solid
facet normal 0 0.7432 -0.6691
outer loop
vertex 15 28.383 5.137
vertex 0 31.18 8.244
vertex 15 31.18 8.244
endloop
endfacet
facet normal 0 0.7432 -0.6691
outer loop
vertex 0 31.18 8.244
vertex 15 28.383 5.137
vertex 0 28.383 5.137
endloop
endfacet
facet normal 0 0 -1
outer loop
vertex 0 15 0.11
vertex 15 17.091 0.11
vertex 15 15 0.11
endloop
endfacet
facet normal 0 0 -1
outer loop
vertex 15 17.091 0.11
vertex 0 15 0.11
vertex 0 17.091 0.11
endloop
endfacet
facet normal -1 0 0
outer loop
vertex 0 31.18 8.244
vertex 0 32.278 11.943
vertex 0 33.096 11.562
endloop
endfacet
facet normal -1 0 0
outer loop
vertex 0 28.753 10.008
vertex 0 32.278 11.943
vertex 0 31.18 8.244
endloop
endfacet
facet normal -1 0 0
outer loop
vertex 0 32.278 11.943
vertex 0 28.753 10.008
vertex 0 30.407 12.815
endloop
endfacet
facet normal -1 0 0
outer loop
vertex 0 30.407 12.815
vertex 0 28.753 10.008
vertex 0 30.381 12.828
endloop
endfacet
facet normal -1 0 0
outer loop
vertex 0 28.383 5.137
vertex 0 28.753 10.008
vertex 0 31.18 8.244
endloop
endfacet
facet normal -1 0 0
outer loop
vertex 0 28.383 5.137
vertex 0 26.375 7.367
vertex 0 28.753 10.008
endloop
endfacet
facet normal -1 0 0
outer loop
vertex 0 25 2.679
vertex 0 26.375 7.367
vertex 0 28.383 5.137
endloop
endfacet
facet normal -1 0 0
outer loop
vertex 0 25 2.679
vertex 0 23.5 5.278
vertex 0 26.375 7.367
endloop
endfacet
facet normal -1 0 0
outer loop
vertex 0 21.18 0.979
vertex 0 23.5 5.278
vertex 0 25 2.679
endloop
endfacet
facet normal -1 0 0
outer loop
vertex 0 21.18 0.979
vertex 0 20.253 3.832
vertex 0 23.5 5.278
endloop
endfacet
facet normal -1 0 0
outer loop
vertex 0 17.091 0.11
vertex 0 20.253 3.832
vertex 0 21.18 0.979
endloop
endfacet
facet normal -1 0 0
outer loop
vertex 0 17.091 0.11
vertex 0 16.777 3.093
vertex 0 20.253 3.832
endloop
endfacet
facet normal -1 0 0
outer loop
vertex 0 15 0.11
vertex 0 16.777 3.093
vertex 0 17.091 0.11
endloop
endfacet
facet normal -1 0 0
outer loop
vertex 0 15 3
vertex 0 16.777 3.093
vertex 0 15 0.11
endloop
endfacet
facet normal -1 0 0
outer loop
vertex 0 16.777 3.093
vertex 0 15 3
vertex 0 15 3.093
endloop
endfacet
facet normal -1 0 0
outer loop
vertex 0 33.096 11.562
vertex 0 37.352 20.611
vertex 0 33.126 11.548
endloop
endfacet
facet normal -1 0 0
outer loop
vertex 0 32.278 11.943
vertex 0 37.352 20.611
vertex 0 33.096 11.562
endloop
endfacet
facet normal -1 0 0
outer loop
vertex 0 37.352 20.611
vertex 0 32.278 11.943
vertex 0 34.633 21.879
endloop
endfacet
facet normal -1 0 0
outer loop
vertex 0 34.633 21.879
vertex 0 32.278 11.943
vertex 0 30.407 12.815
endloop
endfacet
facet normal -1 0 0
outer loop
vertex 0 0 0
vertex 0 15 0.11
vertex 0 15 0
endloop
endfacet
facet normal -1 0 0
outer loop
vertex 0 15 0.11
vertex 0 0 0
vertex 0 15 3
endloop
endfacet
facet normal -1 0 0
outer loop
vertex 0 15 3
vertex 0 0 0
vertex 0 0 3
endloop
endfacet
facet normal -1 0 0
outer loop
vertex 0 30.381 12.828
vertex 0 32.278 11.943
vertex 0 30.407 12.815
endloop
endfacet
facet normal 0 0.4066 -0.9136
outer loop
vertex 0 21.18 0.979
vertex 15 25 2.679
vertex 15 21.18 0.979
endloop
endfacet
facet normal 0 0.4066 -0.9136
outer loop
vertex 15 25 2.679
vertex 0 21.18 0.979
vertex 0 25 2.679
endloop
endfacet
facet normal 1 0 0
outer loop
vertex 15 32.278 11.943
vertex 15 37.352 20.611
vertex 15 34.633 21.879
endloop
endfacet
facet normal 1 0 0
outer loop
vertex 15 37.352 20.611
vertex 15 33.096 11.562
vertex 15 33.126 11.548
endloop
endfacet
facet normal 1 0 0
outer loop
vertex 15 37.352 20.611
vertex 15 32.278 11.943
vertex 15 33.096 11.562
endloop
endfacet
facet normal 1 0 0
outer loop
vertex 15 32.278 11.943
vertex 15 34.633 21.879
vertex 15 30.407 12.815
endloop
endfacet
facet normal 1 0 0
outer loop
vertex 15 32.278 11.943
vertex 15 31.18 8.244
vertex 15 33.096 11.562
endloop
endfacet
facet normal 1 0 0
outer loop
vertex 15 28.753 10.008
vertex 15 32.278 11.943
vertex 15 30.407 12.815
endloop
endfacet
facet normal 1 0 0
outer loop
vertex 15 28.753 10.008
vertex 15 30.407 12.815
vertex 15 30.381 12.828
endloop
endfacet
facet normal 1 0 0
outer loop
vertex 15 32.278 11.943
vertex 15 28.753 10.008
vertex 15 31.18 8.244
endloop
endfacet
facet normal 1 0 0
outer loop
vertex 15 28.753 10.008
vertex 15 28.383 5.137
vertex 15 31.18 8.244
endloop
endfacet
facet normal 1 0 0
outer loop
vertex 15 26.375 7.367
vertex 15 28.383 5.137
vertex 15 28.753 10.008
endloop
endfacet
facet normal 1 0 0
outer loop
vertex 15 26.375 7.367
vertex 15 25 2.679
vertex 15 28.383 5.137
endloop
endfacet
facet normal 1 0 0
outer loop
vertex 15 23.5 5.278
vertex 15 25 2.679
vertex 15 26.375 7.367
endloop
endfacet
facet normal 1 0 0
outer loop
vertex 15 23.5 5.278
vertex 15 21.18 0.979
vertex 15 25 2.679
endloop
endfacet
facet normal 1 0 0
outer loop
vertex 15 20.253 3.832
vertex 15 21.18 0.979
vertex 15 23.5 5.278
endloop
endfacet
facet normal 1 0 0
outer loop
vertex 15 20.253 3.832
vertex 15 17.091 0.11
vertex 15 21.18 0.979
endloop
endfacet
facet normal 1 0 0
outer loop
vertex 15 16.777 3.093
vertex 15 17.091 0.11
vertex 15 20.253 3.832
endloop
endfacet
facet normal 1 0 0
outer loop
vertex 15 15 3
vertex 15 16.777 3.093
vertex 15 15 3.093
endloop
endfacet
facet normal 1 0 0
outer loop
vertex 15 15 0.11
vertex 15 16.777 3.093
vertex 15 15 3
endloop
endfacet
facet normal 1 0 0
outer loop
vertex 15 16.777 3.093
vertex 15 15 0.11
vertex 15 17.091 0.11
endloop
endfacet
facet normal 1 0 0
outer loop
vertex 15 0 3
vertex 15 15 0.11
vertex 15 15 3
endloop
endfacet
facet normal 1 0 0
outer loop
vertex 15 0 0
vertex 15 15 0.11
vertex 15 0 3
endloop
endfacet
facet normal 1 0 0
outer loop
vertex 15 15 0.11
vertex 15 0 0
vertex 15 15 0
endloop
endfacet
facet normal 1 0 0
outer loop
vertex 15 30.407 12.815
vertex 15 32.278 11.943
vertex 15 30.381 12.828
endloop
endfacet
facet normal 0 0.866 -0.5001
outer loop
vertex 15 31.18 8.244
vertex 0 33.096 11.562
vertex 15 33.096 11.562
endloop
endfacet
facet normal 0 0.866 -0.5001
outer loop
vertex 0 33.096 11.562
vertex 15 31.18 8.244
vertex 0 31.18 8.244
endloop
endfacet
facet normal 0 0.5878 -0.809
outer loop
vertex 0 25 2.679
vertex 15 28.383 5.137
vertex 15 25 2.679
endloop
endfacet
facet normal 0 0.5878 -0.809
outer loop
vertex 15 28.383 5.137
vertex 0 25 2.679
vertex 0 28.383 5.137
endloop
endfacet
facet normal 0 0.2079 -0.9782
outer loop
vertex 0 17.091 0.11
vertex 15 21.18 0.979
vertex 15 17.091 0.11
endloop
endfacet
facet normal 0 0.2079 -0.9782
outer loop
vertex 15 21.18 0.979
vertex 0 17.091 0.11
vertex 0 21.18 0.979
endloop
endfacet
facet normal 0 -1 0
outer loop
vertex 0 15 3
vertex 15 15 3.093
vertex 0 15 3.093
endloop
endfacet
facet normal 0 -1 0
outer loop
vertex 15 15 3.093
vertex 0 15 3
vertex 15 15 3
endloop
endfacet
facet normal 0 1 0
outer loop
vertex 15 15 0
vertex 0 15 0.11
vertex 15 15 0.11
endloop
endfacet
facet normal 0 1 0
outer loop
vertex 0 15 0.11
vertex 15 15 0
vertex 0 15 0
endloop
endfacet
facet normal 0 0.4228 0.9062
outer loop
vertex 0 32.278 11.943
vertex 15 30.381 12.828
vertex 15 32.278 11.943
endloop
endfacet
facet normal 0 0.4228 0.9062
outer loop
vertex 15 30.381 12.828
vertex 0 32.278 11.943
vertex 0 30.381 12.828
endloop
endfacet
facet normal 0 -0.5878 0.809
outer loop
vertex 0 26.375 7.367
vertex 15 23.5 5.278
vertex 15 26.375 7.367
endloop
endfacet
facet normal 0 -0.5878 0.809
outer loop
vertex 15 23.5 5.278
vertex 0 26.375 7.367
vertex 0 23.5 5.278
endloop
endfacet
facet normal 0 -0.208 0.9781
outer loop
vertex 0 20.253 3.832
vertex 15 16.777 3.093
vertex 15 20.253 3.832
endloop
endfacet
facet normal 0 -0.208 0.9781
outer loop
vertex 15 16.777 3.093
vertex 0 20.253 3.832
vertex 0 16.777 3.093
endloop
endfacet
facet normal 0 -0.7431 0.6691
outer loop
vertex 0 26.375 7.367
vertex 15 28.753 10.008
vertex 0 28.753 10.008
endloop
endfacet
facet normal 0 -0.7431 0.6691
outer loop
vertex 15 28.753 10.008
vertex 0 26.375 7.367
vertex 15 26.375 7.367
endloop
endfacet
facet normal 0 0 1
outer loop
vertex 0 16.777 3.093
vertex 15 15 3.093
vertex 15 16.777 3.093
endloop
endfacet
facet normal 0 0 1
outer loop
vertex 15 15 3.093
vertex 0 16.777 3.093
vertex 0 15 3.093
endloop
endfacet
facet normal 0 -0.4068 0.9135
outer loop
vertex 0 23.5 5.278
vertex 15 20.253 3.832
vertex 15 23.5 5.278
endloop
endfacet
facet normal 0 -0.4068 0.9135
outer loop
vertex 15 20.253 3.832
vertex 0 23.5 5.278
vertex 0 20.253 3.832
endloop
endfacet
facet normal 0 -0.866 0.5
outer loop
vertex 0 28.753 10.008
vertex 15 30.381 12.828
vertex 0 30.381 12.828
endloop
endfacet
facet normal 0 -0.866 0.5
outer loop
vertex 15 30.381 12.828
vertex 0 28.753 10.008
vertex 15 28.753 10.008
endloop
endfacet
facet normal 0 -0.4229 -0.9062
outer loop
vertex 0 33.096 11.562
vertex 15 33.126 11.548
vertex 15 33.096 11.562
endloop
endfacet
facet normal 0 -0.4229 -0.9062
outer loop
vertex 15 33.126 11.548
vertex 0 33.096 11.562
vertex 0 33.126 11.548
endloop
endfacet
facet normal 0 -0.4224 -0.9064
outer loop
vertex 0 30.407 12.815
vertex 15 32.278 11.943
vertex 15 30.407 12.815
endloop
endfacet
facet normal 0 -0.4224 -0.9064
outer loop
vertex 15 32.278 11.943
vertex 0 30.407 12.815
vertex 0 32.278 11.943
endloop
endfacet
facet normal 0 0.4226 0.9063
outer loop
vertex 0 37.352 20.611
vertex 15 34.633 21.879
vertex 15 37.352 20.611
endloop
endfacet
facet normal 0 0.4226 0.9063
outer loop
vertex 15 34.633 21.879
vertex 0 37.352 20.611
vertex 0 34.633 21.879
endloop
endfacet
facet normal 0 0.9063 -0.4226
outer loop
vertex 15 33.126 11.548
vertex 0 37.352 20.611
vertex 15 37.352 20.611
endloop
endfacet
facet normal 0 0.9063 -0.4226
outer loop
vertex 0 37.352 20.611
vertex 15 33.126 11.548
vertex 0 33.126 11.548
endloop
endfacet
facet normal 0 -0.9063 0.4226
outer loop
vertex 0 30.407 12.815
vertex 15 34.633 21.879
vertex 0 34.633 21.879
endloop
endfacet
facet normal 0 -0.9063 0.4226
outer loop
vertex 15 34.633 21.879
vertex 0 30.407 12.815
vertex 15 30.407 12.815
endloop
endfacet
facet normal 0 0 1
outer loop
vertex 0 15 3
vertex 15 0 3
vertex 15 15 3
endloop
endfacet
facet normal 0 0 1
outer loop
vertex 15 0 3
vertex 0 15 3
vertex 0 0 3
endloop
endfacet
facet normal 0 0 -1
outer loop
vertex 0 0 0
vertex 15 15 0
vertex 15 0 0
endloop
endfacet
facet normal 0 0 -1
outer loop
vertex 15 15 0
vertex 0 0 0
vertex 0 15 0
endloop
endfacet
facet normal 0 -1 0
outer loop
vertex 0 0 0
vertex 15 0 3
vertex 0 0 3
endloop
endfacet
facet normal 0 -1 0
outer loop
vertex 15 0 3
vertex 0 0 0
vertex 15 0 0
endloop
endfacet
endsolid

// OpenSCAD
// file: halfCylinder.scad
// Example:
halfCylinder(
  z = 20,
  r = 10
);

module halfCylinder(
  z,
  r,
  mergeMargin = 1 // i.e. how much to overlap joined solids
) {
  difference() {
    // Cylinder itself:
    cylinder(z, r = r);
    // Cutoff part:
    translate([ 0, -r, -mergeMargin ])
    cube([ r, r * 2, z + mergeMargin * 2 ]);
  }
}
// file: pieSlice.scad
use <halfCylinder.scad>;

// Example:
pieSlice(
  z = 10,
  r = 20,
  angle = 65
);

module pieSlice(
  z,
  r,
  angle,
  mergeMargin = 1 // i.e. how much to overlap joined solids
) {
  if (angle < 180) {
    // Cut a half-cylinder out of another:
    difference() {
      halfCylinder(z, r = r);
      rotate([ 0, 0, angle ])
      translate([ 0, 0, -mergeMargin ])
      halfCylinder(z + mergeMargin * 2, r = r + mergeMargin);
    }
  } else if (angle <= 360) {
    // Combine two half-cylinders with overlap:
    halfCylinder(z, r = r);
    rotate([ 0, 0, angle - 180 ])
    halfCylinder(z, r = r);
  }
}
// main file
use <pieSlice.scad>;

// Example:
bentCube(
  x = 15,
  y1 = 15,
  r = 20,
  deg = 65,
  y2 = 10,
  z = 3
);

module bentCube(
  x,
  y1,
  r,
  deg,
  y2,
  z,
  mergeMargin = 1 // i.e. how much to overlap joined solids
) {
  // 1st segment (y1):
  cube([ x, y1, z ]);

  translate([ 0, y1, r ])
  rotate([ -90, 0, 0 ])
  rotate([ 0, 90, 0 ])
  {
    // 2nd segment (r & deg):
    difference() {
      pieSlice(x, r, deg);
      translate([ 0, 0, -mergeMargin ])
      cylinder(x + mergeMargin * 2, r = r - z);
    }

    // 3rd segment (y2):
    rotate([ 0, 0, deg ])
    translate([ -y2, r - z, 0 ])
    cube([ y2, z, x ]);
  }
}
